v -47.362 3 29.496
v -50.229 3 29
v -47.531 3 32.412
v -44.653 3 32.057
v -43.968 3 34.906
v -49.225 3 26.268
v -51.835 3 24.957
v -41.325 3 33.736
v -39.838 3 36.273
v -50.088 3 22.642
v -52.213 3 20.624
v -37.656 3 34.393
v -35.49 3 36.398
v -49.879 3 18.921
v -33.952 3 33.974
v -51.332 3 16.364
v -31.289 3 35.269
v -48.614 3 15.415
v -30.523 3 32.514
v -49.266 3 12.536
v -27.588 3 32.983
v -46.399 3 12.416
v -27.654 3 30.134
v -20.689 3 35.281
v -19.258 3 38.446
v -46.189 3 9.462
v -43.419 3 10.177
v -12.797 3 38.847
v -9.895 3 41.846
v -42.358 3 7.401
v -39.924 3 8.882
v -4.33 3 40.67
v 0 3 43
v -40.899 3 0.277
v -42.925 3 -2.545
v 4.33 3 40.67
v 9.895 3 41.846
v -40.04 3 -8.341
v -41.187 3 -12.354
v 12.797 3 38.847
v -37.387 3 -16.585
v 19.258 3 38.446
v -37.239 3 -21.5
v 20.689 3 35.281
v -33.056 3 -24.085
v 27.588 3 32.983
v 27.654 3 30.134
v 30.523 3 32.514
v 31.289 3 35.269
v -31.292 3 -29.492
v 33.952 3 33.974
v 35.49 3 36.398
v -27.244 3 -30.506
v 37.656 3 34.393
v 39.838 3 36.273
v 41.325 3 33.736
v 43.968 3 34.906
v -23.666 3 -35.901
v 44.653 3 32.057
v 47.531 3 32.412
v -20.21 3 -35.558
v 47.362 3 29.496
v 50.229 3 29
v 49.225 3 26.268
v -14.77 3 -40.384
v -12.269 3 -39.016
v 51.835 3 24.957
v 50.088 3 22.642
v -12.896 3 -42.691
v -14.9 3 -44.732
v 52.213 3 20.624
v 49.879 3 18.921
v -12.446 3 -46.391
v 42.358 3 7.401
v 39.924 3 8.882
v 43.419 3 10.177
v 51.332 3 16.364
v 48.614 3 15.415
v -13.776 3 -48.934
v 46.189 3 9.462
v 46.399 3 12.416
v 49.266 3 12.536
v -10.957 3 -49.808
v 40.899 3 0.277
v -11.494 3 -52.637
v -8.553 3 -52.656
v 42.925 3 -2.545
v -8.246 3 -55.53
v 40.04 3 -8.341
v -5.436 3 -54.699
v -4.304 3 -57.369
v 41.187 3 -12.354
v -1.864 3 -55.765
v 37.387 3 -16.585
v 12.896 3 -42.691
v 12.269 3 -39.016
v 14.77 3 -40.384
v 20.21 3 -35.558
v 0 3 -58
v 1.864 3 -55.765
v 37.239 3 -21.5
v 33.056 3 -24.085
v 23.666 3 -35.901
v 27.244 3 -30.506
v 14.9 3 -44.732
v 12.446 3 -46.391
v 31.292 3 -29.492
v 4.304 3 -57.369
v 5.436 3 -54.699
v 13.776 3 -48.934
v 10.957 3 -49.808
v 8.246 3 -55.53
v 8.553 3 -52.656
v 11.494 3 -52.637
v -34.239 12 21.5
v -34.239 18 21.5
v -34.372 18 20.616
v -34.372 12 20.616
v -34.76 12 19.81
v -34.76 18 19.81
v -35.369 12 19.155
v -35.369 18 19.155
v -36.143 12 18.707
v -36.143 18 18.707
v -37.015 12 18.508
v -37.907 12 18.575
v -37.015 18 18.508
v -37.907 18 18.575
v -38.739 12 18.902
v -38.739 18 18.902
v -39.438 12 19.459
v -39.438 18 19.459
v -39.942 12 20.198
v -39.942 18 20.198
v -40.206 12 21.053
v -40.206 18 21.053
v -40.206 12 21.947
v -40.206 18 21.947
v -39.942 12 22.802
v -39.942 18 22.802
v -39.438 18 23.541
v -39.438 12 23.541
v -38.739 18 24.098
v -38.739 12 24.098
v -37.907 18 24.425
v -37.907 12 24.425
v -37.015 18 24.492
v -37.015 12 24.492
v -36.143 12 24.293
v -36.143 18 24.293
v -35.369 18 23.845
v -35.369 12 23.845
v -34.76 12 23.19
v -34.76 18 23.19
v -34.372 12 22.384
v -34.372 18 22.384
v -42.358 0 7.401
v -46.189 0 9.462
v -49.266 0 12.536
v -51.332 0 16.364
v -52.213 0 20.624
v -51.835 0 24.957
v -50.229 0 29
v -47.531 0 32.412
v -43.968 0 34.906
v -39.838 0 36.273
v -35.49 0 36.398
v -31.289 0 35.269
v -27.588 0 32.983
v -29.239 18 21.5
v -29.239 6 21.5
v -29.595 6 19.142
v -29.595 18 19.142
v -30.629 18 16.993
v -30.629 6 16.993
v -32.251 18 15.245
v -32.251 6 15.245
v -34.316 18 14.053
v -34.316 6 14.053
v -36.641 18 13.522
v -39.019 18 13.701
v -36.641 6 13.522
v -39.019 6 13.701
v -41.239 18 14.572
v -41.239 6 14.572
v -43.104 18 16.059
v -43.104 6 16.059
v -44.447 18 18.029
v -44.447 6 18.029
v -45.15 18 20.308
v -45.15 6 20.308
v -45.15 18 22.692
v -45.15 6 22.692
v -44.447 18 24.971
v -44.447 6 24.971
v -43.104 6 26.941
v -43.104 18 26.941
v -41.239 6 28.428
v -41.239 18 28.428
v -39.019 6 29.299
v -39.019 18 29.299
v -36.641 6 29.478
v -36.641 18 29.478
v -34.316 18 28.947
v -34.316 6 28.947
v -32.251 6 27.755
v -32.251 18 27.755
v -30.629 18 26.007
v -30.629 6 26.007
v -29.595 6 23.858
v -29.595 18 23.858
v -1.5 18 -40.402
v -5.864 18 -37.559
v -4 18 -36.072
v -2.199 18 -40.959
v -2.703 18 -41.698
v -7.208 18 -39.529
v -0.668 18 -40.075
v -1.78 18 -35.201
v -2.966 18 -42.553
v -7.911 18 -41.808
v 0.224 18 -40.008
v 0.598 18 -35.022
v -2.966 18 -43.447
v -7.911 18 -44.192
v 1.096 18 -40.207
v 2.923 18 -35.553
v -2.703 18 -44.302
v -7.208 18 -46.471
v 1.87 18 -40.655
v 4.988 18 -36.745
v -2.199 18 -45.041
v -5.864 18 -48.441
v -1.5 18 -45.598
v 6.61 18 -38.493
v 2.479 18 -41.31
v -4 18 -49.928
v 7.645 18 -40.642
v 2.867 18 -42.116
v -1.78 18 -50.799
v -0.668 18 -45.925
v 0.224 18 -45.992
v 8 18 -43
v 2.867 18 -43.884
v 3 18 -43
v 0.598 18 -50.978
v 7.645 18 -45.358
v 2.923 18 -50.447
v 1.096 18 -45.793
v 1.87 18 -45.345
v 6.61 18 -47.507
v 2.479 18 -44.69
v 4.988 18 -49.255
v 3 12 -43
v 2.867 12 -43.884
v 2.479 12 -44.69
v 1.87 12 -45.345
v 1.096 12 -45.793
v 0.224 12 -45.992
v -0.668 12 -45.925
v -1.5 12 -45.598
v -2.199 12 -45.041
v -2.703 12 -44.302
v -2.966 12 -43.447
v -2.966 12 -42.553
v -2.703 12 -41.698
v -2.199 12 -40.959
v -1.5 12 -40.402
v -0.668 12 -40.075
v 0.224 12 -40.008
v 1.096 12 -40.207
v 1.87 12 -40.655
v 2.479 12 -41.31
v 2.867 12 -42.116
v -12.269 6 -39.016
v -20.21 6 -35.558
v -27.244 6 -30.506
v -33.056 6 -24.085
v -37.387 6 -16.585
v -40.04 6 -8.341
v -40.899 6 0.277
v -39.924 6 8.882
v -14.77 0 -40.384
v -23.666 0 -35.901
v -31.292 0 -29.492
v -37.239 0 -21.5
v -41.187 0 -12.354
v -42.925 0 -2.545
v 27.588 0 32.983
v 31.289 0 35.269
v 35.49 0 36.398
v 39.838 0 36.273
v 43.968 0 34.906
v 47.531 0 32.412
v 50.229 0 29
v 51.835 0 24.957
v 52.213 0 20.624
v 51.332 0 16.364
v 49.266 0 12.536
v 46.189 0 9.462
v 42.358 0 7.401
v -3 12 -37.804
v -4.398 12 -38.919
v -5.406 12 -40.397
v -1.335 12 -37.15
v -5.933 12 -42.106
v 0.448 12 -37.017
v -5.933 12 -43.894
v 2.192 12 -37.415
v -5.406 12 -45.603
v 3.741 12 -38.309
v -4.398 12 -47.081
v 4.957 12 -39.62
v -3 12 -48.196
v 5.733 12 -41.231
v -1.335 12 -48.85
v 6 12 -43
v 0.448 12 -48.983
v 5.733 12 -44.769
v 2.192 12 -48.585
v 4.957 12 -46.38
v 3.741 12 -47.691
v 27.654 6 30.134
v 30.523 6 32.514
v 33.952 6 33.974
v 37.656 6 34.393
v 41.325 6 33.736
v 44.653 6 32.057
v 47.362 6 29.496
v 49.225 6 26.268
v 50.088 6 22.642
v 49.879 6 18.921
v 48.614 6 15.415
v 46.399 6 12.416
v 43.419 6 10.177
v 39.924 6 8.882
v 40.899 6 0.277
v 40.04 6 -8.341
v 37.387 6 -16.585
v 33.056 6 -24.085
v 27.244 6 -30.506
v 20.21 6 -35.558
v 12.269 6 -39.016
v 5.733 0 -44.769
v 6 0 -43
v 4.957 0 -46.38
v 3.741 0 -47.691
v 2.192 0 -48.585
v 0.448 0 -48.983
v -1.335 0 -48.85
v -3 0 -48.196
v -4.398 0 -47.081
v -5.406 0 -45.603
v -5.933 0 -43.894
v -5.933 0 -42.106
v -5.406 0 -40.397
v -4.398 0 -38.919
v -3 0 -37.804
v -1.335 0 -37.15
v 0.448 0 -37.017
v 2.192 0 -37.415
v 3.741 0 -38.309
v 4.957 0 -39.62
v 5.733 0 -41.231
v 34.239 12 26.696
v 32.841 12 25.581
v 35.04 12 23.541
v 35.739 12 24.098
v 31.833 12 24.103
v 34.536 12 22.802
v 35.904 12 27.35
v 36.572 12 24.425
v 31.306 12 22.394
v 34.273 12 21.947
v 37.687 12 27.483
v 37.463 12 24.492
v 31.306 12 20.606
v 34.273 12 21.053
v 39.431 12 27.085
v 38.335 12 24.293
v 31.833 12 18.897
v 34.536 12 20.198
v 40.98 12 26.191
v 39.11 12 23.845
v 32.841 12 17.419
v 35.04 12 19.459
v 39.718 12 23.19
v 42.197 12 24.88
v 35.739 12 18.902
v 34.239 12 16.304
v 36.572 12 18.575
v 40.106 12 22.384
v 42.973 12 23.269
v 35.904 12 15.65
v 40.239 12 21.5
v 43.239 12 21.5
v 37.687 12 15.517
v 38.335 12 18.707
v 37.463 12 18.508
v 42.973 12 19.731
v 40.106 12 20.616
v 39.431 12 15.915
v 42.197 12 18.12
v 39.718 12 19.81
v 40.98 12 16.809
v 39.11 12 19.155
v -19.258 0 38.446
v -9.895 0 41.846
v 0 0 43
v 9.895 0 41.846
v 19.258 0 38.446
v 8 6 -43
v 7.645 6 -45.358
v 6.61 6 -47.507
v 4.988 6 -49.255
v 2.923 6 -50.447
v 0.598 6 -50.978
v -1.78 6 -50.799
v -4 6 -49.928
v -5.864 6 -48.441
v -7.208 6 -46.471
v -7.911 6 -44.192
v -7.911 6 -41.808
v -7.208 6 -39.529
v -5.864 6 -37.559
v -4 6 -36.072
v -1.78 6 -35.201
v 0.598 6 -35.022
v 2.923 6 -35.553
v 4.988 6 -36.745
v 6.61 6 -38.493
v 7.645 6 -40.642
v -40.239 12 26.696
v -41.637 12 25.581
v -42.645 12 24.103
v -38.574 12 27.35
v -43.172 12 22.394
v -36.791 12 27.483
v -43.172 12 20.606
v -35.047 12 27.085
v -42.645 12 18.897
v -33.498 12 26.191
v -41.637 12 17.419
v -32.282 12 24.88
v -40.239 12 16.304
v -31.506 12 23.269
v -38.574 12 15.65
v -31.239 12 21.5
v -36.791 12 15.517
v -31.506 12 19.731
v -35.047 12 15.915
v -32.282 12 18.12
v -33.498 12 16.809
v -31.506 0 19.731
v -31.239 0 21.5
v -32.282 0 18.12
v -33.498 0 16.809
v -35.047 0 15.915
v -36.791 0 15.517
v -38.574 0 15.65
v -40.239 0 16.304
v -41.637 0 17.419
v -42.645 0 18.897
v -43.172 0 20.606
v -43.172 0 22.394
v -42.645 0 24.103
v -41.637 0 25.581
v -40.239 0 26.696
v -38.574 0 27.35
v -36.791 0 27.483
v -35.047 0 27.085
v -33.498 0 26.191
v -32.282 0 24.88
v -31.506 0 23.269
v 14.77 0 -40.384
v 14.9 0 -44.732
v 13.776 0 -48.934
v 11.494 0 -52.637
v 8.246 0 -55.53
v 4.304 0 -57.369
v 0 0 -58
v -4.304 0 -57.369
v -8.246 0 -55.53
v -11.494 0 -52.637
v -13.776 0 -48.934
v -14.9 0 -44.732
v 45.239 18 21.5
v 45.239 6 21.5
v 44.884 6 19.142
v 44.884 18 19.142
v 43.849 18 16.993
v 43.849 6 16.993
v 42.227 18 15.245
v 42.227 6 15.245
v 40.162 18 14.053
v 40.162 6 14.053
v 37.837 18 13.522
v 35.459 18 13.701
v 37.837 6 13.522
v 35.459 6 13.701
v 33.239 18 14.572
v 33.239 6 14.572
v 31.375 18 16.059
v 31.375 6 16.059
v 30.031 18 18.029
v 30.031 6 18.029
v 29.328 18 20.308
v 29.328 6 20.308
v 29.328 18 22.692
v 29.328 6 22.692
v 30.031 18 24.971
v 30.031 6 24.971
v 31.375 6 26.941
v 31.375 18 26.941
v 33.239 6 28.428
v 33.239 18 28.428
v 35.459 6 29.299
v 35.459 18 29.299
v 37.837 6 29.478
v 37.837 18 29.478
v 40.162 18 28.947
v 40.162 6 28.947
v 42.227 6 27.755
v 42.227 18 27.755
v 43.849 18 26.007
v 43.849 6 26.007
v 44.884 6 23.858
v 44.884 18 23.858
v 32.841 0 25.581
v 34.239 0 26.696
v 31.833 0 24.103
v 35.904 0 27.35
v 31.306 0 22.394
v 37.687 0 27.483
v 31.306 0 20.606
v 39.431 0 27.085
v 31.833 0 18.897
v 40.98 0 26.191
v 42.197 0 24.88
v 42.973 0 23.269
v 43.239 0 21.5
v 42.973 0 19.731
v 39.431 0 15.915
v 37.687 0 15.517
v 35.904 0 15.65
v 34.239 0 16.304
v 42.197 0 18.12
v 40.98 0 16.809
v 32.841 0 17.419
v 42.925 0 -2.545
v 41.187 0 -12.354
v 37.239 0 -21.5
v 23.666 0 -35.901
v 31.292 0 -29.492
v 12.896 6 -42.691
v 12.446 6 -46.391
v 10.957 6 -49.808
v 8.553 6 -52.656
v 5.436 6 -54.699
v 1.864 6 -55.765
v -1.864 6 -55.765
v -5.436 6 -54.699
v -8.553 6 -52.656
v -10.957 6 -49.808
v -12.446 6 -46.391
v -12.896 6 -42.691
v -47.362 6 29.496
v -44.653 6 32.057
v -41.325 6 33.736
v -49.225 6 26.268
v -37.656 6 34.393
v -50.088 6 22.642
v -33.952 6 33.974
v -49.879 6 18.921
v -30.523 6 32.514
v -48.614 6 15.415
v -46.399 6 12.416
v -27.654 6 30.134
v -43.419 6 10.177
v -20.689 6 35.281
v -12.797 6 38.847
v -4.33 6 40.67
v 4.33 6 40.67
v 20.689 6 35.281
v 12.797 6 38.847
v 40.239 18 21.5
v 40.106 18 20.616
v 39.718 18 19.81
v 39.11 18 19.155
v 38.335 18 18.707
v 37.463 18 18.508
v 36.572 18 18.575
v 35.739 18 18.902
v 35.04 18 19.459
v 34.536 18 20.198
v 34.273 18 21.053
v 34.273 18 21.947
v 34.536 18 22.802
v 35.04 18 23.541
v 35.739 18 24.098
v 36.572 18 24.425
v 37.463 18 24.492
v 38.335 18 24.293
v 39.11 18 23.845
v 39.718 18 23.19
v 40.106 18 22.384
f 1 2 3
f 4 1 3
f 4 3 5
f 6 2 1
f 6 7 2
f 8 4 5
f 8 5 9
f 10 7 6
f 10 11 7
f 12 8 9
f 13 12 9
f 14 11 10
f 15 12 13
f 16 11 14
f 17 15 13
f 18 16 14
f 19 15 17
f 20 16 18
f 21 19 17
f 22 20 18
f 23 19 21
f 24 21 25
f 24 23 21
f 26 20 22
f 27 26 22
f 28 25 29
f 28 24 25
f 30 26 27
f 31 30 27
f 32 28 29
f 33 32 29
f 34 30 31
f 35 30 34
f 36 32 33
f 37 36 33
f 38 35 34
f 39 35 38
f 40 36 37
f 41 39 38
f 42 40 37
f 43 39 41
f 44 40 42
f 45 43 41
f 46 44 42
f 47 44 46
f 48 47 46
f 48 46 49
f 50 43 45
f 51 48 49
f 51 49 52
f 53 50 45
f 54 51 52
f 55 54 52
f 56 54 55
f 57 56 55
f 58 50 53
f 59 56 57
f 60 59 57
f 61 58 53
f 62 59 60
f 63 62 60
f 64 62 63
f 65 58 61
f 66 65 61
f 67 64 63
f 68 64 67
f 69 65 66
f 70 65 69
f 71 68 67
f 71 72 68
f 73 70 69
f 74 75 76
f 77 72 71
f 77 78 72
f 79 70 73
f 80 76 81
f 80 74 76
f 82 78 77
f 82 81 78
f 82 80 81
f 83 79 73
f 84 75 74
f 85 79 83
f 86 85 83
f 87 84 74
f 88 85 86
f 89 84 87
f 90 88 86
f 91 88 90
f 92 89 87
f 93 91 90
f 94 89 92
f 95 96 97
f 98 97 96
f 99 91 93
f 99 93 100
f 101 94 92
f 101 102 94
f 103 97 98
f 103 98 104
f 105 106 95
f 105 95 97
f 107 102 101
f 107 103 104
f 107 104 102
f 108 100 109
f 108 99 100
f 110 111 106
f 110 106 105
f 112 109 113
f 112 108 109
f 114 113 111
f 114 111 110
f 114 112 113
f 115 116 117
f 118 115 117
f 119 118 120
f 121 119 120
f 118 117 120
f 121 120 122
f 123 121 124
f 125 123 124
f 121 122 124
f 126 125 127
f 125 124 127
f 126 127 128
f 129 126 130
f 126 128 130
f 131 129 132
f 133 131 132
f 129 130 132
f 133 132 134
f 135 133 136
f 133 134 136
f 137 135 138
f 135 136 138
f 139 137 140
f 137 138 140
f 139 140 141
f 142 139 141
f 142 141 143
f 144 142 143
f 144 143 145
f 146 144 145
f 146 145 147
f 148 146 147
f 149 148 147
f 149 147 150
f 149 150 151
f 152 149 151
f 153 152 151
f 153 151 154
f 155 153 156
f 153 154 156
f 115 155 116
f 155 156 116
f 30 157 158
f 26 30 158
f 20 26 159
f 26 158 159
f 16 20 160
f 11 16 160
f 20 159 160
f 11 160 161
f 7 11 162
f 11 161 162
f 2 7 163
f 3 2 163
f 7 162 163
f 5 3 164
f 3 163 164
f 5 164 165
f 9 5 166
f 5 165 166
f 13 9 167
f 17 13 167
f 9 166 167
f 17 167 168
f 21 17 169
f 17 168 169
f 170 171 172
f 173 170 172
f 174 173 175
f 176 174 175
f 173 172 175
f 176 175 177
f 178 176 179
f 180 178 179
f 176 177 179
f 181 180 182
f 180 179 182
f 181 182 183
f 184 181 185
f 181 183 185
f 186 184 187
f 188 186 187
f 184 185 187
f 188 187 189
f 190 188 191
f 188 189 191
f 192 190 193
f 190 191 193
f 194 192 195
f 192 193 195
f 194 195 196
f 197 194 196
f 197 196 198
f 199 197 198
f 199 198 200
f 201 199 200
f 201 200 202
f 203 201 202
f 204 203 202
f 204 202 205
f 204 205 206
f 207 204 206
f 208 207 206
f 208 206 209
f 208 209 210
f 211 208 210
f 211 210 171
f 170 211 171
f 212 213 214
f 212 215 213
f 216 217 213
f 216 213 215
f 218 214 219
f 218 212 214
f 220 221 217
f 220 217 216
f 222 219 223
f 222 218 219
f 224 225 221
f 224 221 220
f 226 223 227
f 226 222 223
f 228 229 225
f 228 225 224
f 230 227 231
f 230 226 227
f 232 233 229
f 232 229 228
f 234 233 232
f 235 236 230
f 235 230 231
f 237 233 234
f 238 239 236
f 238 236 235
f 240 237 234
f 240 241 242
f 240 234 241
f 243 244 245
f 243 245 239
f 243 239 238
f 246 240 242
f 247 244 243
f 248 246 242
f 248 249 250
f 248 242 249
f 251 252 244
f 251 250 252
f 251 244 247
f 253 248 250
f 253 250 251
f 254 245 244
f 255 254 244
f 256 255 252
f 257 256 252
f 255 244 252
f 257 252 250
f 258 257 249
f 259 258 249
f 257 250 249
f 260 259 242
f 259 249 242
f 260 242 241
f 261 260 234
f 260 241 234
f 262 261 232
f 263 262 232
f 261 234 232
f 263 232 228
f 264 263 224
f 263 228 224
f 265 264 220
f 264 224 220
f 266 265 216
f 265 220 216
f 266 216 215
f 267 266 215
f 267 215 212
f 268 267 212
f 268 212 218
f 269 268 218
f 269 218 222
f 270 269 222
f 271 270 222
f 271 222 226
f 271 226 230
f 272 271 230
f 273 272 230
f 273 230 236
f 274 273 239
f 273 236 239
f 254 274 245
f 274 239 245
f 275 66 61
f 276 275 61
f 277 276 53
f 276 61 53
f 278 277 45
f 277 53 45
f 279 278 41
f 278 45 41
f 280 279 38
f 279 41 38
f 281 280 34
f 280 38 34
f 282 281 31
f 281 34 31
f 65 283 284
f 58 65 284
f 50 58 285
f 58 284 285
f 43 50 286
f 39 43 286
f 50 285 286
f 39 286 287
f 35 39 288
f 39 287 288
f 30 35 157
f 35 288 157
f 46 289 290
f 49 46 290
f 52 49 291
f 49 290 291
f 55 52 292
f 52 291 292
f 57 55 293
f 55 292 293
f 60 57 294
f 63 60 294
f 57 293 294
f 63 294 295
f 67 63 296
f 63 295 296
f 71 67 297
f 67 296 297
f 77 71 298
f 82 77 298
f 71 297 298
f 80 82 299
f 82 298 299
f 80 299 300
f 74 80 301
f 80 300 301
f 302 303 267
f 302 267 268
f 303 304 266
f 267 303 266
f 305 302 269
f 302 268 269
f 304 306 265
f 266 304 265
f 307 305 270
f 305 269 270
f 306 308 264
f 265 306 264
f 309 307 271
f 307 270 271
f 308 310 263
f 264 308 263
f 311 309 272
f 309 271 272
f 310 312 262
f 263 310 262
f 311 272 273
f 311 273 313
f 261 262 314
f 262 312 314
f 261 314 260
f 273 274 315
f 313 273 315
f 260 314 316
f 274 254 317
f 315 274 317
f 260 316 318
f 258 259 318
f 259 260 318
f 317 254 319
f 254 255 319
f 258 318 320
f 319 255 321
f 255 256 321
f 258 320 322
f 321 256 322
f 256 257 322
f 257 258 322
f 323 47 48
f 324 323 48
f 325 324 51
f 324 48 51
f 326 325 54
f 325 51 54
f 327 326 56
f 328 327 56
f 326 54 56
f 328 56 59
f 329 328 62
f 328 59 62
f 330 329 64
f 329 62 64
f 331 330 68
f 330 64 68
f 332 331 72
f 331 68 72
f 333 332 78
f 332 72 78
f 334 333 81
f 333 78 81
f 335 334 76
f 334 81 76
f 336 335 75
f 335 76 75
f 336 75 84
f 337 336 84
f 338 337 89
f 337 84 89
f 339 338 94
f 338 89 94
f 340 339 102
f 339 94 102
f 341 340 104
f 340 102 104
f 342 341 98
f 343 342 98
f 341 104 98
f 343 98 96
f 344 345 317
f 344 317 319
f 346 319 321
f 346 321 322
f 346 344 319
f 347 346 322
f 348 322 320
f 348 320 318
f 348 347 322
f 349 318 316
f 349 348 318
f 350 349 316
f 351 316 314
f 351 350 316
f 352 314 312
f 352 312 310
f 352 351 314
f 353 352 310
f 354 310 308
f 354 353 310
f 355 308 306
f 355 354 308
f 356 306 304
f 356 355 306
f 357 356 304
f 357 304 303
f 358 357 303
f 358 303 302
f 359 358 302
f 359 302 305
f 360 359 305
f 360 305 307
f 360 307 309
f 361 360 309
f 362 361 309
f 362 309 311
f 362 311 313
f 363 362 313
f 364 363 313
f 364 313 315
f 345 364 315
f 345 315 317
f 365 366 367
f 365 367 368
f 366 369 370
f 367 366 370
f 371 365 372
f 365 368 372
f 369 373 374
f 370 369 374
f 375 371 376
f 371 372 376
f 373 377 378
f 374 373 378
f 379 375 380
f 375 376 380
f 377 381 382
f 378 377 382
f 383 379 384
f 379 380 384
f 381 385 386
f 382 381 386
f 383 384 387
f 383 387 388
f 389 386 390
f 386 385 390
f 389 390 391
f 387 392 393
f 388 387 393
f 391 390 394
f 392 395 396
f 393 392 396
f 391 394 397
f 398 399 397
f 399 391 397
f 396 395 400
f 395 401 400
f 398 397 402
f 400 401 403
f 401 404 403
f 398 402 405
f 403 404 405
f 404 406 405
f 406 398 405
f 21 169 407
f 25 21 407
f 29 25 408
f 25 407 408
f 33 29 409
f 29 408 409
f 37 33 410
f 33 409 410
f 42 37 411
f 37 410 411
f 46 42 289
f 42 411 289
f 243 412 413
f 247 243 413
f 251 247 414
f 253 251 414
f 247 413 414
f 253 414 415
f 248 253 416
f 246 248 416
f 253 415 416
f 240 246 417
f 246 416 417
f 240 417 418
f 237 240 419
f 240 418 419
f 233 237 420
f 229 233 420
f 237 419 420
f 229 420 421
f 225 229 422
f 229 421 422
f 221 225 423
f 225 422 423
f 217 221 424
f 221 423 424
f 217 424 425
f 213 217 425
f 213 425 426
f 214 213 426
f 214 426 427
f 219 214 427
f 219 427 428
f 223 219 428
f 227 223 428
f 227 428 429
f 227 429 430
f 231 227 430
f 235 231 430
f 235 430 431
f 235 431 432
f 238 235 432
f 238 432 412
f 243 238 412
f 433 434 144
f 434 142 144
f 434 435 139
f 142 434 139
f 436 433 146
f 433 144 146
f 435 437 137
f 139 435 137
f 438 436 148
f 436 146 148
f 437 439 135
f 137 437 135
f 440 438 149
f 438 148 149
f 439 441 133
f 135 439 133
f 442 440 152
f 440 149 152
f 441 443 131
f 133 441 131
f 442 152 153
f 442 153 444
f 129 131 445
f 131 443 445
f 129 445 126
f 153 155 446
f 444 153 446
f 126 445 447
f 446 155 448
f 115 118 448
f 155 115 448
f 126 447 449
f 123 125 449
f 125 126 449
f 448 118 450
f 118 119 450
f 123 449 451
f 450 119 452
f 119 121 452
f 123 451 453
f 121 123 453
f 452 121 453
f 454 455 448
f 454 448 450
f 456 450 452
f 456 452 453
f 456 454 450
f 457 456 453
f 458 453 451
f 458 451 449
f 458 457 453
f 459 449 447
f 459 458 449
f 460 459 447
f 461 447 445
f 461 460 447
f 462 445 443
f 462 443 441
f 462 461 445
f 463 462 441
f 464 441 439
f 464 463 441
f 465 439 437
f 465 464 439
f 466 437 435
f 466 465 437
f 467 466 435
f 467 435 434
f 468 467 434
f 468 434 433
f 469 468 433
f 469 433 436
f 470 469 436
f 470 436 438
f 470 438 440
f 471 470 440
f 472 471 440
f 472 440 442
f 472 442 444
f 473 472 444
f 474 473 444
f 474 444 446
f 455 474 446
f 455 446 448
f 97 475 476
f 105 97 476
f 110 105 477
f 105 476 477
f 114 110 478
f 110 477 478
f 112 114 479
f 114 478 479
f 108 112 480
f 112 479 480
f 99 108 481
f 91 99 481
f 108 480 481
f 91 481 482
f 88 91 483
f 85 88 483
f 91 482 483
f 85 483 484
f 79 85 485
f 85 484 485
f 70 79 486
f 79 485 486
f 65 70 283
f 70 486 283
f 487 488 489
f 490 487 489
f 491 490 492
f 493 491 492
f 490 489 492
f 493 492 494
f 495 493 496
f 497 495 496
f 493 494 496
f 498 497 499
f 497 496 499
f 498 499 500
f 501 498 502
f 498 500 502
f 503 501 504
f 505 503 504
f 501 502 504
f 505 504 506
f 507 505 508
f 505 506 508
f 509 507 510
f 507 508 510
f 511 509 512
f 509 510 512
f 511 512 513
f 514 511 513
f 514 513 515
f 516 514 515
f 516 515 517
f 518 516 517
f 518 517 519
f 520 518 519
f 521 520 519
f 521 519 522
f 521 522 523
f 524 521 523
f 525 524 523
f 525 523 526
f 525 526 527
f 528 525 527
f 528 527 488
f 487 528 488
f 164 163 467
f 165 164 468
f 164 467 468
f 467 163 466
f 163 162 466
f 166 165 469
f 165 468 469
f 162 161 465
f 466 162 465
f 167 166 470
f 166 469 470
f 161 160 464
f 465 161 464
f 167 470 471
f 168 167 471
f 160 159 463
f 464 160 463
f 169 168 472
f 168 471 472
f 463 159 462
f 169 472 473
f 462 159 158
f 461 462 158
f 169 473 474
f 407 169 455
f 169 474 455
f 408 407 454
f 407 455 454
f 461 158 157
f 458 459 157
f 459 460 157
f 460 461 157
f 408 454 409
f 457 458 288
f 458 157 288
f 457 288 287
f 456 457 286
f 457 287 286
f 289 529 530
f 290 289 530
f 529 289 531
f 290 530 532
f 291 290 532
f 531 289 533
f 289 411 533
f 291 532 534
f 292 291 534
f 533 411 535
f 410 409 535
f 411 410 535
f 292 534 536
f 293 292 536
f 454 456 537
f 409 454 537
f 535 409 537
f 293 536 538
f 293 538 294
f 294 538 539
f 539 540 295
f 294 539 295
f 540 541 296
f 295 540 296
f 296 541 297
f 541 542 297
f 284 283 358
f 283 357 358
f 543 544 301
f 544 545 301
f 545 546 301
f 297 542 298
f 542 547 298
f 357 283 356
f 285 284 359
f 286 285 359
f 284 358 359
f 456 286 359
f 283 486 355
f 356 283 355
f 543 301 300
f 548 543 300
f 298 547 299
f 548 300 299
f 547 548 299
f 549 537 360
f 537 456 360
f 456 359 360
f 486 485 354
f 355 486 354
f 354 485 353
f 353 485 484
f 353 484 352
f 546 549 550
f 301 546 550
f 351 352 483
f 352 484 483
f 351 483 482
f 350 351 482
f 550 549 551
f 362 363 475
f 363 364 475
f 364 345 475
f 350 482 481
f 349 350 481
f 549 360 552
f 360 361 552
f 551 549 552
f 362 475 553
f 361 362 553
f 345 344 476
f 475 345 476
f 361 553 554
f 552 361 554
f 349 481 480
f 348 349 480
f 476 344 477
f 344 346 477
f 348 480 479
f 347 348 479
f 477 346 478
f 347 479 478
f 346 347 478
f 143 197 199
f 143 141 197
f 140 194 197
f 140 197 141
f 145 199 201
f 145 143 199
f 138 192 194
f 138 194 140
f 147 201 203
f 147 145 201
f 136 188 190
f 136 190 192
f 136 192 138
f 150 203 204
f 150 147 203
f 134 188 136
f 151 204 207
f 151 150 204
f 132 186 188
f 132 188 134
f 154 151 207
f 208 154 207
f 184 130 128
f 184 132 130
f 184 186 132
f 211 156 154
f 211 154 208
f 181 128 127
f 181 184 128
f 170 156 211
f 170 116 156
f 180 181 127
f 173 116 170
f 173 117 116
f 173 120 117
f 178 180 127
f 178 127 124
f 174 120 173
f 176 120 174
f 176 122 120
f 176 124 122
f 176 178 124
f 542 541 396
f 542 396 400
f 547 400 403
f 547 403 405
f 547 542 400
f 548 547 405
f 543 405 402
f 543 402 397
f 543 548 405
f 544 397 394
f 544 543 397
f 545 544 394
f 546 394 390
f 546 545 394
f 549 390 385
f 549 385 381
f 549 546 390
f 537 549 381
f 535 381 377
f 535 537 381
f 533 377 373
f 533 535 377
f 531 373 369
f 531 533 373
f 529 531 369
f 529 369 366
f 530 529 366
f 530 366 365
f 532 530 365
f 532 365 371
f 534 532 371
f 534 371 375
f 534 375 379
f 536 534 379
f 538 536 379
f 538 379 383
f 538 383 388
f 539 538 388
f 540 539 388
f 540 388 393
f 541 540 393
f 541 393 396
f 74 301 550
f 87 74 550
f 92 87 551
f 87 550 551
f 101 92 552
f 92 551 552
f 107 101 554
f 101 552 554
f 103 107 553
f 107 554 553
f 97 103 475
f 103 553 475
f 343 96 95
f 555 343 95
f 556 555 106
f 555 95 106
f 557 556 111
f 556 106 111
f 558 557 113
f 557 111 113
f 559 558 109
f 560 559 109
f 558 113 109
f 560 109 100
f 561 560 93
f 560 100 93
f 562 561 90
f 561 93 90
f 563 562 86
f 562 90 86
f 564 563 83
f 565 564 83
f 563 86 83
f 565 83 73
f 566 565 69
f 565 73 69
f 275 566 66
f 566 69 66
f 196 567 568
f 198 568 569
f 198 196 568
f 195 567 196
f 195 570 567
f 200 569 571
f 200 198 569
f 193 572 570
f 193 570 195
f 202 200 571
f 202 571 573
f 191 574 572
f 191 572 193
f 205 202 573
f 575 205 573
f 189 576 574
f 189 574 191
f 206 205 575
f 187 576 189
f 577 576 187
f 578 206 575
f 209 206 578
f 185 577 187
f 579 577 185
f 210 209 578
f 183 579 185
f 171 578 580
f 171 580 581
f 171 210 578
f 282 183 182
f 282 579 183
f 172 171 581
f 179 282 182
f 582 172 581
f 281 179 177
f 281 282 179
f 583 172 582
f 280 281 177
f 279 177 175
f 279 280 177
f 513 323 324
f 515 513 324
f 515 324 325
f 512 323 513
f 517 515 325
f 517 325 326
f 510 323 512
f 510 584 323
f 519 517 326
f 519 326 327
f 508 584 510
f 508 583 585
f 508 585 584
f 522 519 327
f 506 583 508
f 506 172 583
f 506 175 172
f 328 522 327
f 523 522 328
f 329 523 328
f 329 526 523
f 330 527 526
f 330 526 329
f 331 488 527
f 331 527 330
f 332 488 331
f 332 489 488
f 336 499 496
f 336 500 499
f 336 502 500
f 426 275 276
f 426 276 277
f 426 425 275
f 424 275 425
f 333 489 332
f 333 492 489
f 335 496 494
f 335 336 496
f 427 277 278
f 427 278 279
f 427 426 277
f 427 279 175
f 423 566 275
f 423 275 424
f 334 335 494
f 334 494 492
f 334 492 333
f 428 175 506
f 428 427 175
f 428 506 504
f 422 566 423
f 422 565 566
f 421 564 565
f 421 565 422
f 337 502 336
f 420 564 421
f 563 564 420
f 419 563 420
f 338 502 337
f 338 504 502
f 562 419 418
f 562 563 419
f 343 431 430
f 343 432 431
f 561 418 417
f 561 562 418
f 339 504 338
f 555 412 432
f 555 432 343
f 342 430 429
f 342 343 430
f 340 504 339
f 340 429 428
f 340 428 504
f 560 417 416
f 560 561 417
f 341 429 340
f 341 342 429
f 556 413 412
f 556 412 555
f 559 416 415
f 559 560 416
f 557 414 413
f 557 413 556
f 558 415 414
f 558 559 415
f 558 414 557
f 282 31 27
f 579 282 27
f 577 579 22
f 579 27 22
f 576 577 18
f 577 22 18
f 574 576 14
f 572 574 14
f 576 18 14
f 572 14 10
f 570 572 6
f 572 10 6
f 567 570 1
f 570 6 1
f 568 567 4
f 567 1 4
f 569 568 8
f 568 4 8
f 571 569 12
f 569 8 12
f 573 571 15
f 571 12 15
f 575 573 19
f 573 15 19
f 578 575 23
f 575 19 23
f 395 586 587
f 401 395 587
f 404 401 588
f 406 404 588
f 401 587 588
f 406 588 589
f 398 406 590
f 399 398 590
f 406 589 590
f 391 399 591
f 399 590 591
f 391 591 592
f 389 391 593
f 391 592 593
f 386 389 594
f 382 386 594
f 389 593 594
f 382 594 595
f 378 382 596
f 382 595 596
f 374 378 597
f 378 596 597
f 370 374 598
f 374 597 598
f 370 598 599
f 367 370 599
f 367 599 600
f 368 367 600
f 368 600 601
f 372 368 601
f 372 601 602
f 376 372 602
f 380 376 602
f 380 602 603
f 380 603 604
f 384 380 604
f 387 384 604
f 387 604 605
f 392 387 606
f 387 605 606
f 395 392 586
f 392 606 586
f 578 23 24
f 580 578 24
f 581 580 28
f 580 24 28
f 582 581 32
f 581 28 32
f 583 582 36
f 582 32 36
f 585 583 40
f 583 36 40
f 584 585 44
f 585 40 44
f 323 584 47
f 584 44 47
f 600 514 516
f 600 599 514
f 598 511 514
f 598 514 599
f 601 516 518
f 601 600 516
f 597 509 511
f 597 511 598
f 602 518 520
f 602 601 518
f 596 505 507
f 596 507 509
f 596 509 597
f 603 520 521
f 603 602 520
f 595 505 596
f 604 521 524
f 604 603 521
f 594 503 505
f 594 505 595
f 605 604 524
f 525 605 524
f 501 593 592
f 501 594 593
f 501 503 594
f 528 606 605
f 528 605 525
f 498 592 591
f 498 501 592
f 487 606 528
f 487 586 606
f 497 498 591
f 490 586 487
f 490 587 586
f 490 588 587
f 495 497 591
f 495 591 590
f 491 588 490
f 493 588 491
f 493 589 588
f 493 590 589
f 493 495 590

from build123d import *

# Parameters (mm, degrees)
SKETCH1_R           = 6
BOSS_EXTRUDE1_DEPTH = 3
SKETCH1_3_R         = 8
SKETCH1_3_R_2       = 6
BOSS_EXTRUDE2_DEPTH = 18
SKETCH2_R           = 8
BOSS_EXTRUDE3_DEPTH = 3
BOSS_EXTRUDE4_START = -6
SKETCH3_R           = 6
SKETCH3_R_2         = 3
BOSS_EXTRUDE4_DEPTH = 6


with BuildPart() as part:
    # Sketch1 → Boss-Extrude1 (new body)
    with BuildSketch(Plane(origin=(0, 0, 0), x_dir=(1, 0, 0), z_dir=(0, 1, 0))):
        with BuildLine():
            ThreePointArc((42.358365189, -7.400601228), (37.239092363, 21.5), (14.770073928, 40.38372093))
            ThreePointArc((14.770073928, 40.38372093), (0, 58), (-14.770073928, 40.38372093))
            ThreePointArc((-14.770073928, 40.38372093), (-37.239092363, 21.5), (-42.358365189, -7.400601228))
            ThreePointArc((-42.358365189, -7.400601228), (-50.229473419, -29), (-27.588291261, -32.983119702))
            ThreePointArc((-27.588291261, -32.983119702), (0, -43), (27.588291261, -32.983119702))
            ThreePointArc((27.588291261, -32.983119702), (50.22947342, -29), (42.358365189, -7.400601228))
        make_face()
        with Locations((37.239092363, -21.5)):
            Circle(SKETCH1_R, mode=Mode.SUBTRACT)
        with Locations((-37.239092363, -21.5)):
            Circle(SKETCH1_R, mode=Mode.SUBTRACT)
        with Locations((0, 43)):
            Circle(SKETCH1_R, mode=Mode.SUBTRACT)
    extrude(amount=BOSS_EXTRUDE1_DEPTH)

    # Sketch1<3> → Boss-Extrude2 (add)
    # profile 1 of 3: a face of its own
    with BuildSketch(Plane(origin=(0, 0, 0), x_dir=(1, 0, 0), z_dir=(0, 1, 0))):
        with Locations((0, 43)):
            Circle(SKETCH1_3_R)
        with Locations((0, 43)):
            Circle(SKETCH1_3_R_2, mode=Mode.SUBTRACT)
    # profile 2 of 3: a face of its own
    with BuildSketch(Plane(origin=(0, 0, 0), x_dir=(1, 0, 0), z_dir=(0, 1, 0))):
        with Locations((37.239092363, -21.5)):
            Circle(SKETCH1_3_R)
        with Locations((37.239092363, -21.5)):
            Circle(SKETCH1_3_R_2, mode=Mode.SUBTRACT)
    # profile 3 of 3: a face of its own
    with BuildSketch(Plane(origin=(0, 0, 0), x_dir=(1, 0, 0), z_dir=(0, 1, 0))):
        with Locations((-37.239092363, -21.5)):
            Circle(SKETCH1_3_R)
        with Locations((-37.239092363, -21.5)):
            Circle(SKETCH1_3_R_2, mode=Mode.SUBTRACT)
    extrude(amount=BOSS_EXTRUDE2_DEPTH)

    # Sketch2 → Boss-Extrude3 (add)
    with BuildSketch(Plane(origin=(0, 3, 0), x_dir=(1, 0, 0), z_dir=(0, 1, 0))):
        with BuildLine():
            ThreePointArc((12.269472994, 39.01627907), (0, 55.9), (-12.269472994, 39.01627907))
            ThreePointArc((-12.269472994, 39.01627907), (-35.420439015, 20.45), (-39.923825333, -8.882464231))
            ThreePointArc((-39.923825333, -8.882464231), (-48.410820072, -27.95), (-27.654352339, -30.133814839))
            ThreePointArc((-27.654352339, -30.133814839), (0, -40.9), (27.654352339, -30.133814839))
            ThreePointArc((27.654352339, -30.133814839), (48.410820072, -27.95), (39.923825333, -8.882464231))
            ThreePointArc((39.923825333, -8.882464231), (35.420439015, 20.45), (12.269472994, 39.01627907))
        make_face()
        with Locations((-37.239092363, -21.5)):
            Circle(SKETCH2_R, mode=Mode.SUBTRACT)
        with Locations((37.239092363, -21.5)):
            Circle(SKETCH2_R, mode=Mode.SUBTRACT)
        with Locations((0, 43)):
            Circle(SKETCH2_R, mode=Mode.SUBTRACT)
    extrude(amount=BOSS_EXTRUDE3_DEPTH)

    # Sketch3 → Boss-Extrude4 (add)
    # profile 1 of 3: a face of its own
    with BuildSketch(Plane(origin=(0, 18, 0), x_dir=(1, 0, 0), z_dir=(0, 1, 0)).offset(BOSS_EXTRUDE4_START)):
        with Locations((-37.239092363, -21.5)):
            Circle(SKETCH3_R)
        with Locations((-37.239092363, -21.5)):
            Circle(SKETCH3_R_2, mode=Mode.SUBTRACT)
    # profile 2 of 3: a face of its own
    with BuildSketch(Plane(origin=(0, 18, 0), x_dir=(1, 0, 0), z_dir=(0, 1, 0)).offset(BOSS_EXTRUDE4_START)):
        with Locations((0, 43)):
            Circle(SKETCH3_R)
        with Locations((0, 43)):
            Circle(SKETCH3_R_2, mode=Mode.SUBTRACT)
    # profile 3 of 3: a face of its own
    with BuildSketch(Plane(origin=(0, 18, 0), x_dir=(1, 0, 0), z_dir=(0, 1, 0)).offset(BOSS_EXTRUDE4_START)):
        with Locations((37.239092363, -21.5)):
            Circle(SKETCH3_R)
        with Locations((37.239092363, -21.5)):
            Circle(SKETCH3_R_2, mode=Mode.SUBTRACT)
    extrude(amount=BOSS_EXTRUDE4_DEPTH)


solid = part.part
